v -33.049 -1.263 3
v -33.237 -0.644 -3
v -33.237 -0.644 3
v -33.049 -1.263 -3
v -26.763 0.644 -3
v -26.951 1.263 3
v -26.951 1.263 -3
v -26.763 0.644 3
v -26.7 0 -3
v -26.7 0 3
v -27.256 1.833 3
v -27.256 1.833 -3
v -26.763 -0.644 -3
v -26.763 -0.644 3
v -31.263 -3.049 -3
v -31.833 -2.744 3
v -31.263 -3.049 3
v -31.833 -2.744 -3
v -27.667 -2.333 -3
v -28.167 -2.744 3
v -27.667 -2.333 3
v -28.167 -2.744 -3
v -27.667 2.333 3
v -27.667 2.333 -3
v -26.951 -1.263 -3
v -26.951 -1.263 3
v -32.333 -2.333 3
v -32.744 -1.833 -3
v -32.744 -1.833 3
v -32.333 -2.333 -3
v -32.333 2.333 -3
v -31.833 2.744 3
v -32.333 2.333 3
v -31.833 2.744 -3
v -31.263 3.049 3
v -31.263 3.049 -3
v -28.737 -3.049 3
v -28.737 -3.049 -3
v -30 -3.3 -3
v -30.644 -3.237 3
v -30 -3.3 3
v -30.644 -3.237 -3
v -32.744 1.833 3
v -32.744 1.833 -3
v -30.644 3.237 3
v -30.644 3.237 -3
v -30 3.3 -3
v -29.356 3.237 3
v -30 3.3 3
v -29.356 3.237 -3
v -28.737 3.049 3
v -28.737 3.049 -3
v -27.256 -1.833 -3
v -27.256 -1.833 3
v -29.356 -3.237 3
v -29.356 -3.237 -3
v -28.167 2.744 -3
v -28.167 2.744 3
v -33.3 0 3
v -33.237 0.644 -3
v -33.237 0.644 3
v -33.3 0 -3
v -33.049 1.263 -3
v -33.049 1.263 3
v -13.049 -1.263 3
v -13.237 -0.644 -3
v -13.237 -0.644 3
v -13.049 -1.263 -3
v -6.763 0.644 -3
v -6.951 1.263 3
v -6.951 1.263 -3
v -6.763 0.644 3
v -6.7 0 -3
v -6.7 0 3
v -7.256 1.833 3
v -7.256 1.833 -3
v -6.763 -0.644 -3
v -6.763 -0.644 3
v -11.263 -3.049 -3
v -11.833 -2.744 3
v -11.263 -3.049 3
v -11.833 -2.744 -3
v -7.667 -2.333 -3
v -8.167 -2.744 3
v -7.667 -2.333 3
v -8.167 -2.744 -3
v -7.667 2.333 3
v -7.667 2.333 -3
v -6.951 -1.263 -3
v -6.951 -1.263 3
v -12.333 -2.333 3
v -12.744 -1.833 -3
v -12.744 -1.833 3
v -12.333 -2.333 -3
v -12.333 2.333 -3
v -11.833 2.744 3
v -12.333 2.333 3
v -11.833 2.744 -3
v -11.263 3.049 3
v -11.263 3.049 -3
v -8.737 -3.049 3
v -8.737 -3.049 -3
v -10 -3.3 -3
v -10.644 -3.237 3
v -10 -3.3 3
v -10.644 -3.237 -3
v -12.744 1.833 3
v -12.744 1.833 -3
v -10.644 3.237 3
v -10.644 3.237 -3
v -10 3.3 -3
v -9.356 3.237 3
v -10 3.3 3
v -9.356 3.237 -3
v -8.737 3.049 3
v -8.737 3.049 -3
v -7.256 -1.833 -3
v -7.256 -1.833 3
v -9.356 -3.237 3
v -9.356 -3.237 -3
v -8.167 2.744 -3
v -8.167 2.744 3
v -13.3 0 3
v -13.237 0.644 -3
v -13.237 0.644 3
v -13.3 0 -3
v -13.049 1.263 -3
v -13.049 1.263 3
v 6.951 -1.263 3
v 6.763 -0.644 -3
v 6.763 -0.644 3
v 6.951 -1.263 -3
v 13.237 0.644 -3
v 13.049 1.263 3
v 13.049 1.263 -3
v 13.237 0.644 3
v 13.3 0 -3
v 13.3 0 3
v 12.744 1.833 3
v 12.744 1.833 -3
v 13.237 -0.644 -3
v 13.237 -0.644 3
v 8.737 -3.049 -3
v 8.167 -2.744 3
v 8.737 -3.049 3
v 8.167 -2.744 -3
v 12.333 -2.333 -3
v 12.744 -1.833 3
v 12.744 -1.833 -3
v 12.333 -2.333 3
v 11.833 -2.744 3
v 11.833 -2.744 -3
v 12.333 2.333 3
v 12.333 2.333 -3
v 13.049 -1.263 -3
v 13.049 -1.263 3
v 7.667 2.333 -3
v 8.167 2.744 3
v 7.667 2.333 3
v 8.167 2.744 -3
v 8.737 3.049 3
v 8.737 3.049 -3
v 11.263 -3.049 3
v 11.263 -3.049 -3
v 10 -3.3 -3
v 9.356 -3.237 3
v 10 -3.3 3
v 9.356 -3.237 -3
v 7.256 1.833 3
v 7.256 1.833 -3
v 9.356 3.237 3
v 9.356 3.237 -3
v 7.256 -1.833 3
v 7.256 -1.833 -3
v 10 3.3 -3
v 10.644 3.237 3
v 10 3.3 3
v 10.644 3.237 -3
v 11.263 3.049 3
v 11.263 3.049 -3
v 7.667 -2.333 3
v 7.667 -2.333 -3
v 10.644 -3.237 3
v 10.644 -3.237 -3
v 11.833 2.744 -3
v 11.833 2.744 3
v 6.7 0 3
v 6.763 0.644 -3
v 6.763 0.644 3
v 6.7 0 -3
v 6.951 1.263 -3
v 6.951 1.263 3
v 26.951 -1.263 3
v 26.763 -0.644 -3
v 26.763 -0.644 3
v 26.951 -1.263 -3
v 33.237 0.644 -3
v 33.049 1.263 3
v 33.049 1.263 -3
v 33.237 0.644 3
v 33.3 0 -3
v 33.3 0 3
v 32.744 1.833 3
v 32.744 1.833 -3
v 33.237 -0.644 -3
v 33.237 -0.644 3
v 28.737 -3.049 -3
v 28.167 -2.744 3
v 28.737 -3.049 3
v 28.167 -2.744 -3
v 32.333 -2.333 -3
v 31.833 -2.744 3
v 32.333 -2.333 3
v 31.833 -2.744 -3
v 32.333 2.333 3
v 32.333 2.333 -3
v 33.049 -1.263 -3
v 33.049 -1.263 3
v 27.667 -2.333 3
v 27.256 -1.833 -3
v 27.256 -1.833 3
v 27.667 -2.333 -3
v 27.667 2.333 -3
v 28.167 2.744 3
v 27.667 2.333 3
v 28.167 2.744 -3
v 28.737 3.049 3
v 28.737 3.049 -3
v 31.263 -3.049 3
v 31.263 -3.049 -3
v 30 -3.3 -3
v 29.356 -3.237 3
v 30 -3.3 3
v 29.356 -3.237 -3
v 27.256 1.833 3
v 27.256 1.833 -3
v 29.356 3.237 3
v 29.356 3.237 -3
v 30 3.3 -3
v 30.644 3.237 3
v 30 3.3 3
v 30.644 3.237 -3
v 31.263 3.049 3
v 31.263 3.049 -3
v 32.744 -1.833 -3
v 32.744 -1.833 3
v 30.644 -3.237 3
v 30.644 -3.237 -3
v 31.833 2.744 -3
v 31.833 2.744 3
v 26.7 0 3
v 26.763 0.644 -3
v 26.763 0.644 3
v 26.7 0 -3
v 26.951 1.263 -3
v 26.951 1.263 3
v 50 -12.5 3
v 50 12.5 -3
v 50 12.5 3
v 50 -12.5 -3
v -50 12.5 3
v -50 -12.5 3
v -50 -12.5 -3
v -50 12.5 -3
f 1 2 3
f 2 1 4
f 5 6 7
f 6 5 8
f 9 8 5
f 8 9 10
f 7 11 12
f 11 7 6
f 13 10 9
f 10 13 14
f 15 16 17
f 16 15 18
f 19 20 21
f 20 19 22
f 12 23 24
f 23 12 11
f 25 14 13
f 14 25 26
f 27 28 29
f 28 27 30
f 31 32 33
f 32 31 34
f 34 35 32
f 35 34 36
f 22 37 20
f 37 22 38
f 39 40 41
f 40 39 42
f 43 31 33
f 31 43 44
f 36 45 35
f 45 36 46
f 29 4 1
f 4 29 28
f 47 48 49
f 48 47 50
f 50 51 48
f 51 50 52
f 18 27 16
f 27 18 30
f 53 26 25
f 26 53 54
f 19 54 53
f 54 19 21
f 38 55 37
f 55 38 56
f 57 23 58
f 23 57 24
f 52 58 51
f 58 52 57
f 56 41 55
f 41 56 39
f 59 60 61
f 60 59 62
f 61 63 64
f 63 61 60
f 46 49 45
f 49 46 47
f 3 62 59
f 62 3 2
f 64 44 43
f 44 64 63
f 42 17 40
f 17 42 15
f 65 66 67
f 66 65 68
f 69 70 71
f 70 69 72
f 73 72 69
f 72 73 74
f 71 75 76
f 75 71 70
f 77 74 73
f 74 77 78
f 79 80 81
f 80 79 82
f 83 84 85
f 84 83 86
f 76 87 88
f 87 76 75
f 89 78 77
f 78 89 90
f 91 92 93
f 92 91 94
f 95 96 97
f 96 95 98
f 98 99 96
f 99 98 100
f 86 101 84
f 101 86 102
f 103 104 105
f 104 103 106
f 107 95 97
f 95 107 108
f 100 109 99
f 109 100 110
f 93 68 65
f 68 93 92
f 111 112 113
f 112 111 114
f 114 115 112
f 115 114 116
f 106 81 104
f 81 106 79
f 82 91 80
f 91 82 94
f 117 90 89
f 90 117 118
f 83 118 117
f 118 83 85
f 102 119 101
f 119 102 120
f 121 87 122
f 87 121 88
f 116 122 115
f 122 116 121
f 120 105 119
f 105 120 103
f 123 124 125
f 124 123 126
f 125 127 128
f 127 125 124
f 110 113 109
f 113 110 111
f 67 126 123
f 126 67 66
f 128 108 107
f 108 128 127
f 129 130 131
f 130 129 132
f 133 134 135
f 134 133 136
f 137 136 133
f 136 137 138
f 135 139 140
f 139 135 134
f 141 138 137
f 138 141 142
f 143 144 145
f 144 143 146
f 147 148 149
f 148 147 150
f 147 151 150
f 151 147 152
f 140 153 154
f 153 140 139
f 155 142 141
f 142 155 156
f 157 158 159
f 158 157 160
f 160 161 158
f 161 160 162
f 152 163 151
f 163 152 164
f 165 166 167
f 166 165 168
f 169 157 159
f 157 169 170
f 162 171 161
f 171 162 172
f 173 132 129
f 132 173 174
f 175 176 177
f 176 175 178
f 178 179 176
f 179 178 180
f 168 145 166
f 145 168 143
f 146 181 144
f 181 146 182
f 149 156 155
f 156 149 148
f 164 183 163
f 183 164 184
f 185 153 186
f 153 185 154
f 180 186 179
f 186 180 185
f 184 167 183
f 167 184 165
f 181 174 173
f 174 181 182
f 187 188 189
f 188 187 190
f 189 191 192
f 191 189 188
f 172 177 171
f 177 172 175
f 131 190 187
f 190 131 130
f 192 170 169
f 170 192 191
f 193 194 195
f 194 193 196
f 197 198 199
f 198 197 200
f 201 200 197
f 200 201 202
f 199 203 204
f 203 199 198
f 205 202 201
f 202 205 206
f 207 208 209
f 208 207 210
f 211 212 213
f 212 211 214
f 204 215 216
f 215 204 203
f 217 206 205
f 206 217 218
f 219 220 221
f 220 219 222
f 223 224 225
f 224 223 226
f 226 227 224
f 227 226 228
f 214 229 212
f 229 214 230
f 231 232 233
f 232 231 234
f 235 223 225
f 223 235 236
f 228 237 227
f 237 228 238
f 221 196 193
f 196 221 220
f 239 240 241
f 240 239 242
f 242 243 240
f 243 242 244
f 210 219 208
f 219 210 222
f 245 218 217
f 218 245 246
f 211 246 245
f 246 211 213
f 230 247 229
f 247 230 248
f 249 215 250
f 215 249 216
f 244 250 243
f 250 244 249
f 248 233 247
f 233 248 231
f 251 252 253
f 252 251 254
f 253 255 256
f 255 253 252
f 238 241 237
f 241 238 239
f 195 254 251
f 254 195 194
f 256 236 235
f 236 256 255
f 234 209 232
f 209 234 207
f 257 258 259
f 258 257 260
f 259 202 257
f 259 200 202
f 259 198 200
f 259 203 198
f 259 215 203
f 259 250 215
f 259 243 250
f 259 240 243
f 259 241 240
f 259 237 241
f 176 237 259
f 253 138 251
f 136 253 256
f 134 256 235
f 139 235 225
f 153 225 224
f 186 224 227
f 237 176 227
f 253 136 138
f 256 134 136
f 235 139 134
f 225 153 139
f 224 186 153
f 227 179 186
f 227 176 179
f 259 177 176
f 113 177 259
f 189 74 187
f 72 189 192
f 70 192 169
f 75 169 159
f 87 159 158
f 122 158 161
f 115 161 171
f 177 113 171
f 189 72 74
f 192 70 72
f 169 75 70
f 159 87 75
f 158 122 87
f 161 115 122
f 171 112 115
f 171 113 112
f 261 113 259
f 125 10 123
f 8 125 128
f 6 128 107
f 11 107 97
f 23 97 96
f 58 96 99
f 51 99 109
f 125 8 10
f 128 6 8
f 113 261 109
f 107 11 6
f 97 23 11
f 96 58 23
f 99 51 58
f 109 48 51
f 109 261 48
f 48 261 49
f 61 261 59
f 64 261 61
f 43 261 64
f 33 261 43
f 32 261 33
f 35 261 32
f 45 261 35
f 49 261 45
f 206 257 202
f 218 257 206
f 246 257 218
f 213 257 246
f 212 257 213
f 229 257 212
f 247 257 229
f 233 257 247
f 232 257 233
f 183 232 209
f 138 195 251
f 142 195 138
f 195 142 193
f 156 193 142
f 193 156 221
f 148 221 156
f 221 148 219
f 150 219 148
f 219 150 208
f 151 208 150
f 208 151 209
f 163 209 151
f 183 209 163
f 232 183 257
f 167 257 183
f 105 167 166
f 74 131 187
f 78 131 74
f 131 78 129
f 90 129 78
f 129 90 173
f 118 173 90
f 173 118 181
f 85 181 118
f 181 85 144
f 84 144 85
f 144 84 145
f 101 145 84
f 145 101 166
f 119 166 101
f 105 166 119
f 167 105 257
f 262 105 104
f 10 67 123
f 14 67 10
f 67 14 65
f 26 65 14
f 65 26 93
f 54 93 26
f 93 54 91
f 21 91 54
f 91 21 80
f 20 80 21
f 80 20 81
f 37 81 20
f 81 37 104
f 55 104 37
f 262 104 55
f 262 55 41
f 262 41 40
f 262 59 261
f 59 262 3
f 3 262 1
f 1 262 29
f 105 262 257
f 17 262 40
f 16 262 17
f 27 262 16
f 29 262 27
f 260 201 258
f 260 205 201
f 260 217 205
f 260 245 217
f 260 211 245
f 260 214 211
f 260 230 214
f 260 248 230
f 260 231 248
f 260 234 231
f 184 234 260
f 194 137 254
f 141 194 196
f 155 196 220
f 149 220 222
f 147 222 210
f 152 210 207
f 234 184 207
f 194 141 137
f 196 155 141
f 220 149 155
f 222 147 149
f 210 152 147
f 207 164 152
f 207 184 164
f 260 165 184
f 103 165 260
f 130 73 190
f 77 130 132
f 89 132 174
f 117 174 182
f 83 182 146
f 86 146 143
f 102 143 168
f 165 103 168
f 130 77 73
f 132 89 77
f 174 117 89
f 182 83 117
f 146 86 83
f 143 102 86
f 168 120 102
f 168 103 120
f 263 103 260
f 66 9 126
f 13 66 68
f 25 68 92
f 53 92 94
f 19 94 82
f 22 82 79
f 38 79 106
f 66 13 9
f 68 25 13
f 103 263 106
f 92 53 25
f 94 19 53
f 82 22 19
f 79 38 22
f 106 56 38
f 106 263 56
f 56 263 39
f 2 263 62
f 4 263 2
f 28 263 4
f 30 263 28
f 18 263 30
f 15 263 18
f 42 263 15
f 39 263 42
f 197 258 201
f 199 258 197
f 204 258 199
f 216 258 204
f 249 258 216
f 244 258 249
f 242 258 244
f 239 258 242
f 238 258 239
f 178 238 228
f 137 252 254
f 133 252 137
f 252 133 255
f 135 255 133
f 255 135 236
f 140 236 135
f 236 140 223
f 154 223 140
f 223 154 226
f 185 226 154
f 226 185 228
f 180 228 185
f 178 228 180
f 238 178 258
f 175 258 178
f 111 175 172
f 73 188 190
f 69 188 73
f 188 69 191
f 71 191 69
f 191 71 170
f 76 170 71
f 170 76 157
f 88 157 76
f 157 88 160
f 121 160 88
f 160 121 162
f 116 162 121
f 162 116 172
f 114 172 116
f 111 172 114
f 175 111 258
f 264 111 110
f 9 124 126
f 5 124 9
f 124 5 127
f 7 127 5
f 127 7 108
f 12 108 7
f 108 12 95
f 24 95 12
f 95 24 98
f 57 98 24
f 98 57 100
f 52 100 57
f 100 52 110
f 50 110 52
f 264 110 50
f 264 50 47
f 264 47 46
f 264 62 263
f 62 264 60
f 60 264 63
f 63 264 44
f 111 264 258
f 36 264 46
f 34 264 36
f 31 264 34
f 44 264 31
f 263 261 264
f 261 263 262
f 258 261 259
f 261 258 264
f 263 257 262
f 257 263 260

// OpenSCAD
$fn = 32;

// ----------------------------------------------------------------------
// Hole bar, 4 x Ø6.6
// row layout, 20 mm edge offset
// ----------------------------------------------------------------------

// --- parameters (mm) ---
bar_w = 25;    // bar width (Y)
bar_t = 6;     // bar thickness (Z)
holes = 4;     // holes per row
hole_d = 6.6;  // hole diameter
edge = 20;     // offset from the bar end to the first hole
pitch = 20;    // pitch between neighbouring holes

// --- derived feature positions (mm) ---
span = (holes - 1) * pitch;   // = 60   distance between the end holes
bar_l = span + 2 * edge;      // = 100   overall bar length
start_x = -bar_l / 2 + edge;  // = -30   X of the first hole
feature_centers = [
  [start_x + 0 * pitch, 0],
  [start_x + 1 * pitch, 0],
  [start_x + 2 * pitch, 0],
  [start_x + 3 * pitch, 0]
];   // hole centres of the first row

// bar with one row of holes, drilled from feature_centers
difference() {
  translate([-bar_l / 2, -bar_w / 2, -bar_t / 2]) cube([bar_l, bar_w, bar_t]);
  for (centre = feature_centers)
    translate([centre[0], centre[1], 0])
      cylinder(d = hole_d, h = bar_t + 2, center = true);
}
